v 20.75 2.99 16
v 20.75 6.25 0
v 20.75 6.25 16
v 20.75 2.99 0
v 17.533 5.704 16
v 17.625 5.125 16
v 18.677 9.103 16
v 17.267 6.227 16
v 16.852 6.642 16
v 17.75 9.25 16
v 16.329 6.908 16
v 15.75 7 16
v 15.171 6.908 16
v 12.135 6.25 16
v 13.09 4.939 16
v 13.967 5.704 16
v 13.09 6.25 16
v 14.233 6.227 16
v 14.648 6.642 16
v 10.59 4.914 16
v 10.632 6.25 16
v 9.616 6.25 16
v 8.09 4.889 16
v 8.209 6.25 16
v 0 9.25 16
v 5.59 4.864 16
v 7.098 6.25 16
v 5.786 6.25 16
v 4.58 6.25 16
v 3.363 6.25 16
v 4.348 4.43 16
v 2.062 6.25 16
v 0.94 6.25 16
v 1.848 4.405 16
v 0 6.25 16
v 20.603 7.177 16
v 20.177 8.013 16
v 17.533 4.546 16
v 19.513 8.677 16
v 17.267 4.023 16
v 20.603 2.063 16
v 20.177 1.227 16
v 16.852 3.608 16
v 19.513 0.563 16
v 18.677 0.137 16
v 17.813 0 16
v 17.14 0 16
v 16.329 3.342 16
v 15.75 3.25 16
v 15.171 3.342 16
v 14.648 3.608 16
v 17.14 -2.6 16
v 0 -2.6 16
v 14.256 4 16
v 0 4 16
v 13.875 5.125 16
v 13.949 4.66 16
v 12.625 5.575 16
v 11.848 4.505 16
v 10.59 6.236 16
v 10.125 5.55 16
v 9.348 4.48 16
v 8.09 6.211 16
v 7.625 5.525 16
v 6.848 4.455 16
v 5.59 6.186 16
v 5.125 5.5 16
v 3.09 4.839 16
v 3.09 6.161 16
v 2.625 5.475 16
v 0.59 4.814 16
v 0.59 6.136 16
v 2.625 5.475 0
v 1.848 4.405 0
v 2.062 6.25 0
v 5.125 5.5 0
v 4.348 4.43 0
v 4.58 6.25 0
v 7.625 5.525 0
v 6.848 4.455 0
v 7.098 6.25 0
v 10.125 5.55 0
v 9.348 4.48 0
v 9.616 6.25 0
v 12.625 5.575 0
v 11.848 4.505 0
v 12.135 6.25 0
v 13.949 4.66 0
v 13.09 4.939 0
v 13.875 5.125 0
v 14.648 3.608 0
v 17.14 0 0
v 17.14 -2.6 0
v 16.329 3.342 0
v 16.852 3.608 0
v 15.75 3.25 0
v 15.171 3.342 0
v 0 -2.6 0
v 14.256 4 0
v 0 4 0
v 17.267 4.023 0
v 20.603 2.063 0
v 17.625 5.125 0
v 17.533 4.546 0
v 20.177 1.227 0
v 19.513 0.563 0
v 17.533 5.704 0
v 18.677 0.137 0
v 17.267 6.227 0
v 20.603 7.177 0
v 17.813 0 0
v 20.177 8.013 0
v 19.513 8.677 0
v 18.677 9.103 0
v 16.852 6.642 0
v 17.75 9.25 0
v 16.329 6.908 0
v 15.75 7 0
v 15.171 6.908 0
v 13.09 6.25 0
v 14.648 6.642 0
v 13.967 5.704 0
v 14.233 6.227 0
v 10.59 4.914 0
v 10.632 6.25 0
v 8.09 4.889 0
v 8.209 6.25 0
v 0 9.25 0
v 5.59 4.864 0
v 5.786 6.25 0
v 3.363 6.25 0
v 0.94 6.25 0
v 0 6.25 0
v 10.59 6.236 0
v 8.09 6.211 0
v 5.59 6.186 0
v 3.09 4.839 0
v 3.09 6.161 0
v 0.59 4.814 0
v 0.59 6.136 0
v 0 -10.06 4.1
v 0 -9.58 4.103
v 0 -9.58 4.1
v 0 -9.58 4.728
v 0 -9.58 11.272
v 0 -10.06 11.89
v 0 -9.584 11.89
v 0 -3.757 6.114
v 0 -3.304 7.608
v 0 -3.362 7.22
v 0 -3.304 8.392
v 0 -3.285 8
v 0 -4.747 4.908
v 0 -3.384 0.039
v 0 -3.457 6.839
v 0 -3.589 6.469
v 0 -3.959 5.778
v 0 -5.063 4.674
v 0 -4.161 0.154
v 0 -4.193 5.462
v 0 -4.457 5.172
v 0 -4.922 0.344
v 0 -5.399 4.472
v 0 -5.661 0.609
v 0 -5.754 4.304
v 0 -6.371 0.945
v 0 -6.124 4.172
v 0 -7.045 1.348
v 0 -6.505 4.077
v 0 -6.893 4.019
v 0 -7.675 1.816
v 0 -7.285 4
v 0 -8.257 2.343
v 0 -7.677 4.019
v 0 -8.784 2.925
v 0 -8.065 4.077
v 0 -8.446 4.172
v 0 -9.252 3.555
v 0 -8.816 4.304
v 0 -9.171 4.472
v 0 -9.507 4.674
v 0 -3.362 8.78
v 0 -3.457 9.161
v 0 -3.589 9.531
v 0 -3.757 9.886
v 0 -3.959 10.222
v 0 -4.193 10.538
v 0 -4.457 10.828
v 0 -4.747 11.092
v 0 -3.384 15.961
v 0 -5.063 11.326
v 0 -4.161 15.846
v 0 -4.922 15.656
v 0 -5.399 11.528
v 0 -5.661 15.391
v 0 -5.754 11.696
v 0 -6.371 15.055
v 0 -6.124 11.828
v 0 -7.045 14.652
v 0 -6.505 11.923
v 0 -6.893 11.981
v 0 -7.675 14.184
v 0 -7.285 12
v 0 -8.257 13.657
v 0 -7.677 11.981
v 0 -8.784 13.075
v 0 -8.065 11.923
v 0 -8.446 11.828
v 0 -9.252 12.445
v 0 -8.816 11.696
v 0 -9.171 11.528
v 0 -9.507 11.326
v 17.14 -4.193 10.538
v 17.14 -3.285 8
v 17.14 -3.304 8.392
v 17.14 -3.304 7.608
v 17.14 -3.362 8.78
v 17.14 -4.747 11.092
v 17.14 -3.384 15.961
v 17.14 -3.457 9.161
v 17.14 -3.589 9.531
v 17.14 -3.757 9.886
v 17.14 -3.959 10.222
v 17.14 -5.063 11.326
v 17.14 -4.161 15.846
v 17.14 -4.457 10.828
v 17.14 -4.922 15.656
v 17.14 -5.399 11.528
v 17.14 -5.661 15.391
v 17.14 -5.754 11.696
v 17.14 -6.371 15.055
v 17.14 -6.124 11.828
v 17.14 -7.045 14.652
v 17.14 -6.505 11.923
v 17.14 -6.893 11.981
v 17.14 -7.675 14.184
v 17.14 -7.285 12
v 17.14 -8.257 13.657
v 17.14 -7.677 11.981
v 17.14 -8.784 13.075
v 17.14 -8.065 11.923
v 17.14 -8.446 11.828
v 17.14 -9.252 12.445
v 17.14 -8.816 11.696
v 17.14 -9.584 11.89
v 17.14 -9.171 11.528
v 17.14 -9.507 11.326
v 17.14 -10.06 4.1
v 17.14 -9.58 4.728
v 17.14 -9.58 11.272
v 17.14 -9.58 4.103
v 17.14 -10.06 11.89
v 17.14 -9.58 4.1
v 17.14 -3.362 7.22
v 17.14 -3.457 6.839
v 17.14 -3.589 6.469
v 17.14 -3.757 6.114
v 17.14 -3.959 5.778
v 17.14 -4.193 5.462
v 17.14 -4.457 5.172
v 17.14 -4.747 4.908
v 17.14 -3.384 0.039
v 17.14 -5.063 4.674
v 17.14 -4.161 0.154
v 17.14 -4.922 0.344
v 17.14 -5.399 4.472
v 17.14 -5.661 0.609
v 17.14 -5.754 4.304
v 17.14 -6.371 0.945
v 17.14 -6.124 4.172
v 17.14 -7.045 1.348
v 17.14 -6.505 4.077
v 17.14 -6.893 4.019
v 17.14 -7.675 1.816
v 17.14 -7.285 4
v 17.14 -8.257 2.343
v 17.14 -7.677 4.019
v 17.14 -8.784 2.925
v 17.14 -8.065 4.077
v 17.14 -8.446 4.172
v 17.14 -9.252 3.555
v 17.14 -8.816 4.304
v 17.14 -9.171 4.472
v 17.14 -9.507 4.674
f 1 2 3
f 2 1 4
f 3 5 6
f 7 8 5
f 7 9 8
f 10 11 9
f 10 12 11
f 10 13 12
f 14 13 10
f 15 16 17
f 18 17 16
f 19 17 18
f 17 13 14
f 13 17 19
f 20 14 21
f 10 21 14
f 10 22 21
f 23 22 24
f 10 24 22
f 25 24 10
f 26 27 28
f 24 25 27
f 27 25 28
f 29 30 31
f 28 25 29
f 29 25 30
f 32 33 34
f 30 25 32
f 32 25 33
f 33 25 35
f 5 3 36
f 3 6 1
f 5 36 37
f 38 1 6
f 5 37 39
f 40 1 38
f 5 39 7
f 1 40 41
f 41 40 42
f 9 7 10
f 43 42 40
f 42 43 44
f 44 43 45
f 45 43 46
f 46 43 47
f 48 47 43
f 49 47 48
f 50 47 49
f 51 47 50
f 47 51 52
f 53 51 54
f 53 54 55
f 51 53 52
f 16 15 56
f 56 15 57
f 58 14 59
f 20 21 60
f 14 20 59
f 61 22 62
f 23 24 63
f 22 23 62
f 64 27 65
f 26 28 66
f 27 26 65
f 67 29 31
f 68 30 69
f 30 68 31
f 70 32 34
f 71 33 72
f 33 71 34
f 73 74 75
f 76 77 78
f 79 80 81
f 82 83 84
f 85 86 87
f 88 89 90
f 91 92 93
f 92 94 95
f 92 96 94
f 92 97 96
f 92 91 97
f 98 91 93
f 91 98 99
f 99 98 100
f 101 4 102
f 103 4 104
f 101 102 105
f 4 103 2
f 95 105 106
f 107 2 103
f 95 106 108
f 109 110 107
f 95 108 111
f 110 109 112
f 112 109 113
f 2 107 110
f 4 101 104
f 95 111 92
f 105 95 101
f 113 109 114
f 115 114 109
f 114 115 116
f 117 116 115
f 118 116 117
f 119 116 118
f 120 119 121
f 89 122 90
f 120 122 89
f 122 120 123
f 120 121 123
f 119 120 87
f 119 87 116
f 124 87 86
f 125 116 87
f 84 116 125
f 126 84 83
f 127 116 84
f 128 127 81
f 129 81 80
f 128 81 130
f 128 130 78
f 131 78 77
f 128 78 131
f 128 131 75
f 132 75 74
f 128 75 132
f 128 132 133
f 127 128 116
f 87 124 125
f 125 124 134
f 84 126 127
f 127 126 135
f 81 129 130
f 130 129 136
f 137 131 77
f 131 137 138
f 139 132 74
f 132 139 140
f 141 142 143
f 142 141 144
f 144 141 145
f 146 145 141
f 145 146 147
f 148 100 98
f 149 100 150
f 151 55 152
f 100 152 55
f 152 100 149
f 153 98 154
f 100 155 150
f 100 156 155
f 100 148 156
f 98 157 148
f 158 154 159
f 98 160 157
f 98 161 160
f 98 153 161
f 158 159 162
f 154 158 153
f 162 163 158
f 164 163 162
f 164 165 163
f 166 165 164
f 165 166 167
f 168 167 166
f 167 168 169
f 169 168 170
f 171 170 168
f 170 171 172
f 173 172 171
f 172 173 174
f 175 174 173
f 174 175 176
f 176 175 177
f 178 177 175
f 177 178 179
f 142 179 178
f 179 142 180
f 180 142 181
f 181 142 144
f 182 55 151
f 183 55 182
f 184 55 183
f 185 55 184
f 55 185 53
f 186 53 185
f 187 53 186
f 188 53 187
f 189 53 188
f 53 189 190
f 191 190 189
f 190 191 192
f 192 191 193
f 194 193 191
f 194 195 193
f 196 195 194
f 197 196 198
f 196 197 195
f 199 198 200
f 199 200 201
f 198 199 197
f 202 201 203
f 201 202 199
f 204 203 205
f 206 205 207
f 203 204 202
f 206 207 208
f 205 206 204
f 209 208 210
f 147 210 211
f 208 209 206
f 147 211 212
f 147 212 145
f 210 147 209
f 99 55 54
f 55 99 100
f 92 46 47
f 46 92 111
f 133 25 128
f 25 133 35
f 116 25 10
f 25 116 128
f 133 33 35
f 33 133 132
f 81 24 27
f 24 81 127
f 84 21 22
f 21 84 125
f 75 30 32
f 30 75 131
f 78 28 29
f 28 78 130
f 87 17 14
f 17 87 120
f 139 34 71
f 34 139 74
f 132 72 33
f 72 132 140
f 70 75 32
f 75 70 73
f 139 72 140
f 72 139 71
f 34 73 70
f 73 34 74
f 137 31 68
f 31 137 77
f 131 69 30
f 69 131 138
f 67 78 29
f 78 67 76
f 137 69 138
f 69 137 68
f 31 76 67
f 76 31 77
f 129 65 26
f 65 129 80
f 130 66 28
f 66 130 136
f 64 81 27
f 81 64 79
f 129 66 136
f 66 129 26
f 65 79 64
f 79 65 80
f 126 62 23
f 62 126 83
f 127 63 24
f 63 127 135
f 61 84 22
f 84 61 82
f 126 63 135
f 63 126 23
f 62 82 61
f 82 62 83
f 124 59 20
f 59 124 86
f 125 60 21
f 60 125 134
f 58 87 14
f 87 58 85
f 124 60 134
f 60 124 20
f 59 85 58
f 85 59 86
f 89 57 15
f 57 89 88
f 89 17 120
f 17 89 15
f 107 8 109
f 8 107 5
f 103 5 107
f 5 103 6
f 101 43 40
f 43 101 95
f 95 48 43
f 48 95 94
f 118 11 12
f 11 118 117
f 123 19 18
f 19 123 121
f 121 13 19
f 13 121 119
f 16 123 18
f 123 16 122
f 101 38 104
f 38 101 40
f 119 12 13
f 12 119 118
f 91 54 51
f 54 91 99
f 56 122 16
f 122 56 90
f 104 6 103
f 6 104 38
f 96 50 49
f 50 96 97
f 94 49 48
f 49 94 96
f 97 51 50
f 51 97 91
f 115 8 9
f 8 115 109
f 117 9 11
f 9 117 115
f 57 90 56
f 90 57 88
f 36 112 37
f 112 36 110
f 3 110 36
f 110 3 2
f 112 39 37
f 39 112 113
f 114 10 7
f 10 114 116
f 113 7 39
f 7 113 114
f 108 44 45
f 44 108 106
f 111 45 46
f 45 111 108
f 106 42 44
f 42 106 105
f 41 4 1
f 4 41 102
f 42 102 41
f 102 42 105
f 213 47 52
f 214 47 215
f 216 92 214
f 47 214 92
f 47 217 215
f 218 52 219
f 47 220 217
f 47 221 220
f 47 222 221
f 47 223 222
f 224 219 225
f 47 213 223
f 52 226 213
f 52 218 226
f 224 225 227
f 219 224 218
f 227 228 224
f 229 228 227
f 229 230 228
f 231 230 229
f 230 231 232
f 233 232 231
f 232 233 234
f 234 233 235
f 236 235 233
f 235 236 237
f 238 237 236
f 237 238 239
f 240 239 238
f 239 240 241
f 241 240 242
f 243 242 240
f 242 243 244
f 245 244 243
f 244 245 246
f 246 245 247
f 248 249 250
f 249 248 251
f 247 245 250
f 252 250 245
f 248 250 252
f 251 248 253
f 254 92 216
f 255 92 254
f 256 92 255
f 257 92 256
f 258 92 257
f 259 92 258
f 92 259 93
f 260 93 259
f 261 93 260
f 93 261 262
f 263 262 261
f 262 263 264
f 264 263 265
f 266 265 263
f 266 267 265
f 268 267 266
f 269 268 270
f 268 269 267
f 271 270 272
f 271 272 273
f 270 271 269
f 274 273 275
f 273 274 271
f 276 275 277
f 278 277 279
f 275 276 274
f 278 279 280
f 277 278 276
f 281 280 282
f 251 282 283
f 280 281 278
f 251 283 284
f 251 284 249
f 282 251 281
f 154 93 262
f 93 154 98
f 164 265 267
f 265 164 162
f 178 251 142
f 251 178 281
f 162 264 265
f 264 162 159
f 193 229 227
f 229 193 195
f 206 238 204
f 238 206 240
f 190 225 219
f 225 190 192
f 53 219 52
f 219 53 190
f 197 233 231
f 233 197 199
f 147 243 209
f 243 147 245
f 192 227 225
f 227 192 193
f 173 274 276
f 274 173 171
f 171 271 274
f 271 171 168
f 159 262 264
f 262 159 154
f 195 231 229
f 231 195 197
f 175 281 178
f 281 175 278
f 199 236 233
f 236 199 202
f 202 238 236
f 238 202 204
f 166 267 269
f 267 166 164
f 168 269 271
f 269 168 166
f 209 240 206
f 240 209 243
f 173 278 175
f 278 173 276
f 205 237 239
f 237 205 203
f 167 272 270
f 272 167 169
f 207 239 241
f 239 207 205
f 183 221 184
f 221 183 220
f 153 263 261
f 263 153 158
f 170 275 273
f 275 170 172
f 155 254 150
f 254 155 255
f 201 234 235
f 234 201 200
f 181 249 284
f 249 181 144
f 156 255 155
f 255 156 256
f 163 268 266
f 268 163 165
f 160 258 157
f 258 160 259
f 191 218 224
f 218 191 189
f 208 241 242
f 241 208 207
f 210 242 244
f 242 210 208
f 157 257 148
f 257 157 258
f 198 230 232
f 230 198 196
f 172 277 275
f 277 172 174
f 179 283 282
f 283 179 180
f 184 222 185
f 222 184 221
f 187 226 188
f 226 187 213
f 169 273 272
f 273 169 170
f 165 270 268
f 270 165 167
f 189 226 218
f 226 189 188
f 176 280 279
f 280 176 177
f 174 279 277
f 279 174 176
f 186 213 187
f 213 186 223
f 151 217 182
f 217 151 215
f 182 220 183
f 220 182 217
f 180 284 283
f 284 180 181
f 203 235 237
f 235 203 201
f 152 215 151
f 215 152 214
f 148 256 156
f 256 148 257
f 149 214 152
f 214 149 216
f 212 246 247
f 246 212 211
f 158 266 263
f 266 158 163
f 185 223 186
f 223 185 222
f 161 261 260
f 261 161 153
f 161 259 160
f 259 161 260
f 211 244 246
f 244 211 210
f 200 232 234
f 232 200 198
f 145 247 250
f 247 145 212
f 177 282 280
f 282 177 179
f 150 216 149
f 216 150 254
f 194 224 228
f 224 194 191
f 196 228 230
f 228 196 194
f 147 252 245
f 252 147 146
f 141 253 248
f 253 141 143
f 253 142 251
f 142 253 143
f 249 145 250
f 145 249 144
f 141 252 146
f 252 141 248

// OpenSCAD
// This part is pretty specific to my Solidoode 2
//
// Use one of the old 8mm rods I just replaced in the solidoodle as a rail
// for the cable chain to glide on when it is near the left side (where
// most of the weight normally lives).
//
// After testing the initial version, I found that it was too high. Sometimes
// the chain had a hard time getting back on time when moving from right to left.
// This final version os a bit shorter.

extrude_width=0.48;
miny=-13.06;

// The clip, shoved all the way on to the sheetmetal will go 17.14 mm
// into the clip before the edge of the metal hits the back of the clip.
//
clipback=17.14;

// The space required to mount a chain end sitting on it's side.
//
chain_end_width=13.28;

// bars is the thickness of the other bars making up the clip.
//
bars = 3;

// leadingtooth is the gap between the middle bar and the leading tooth
// that sticks down from the top bar. Was 0.4
//
leadingtooth = 0.2;

// trailingtooth is the gap between the middle bar and the innermost
// tooth that sticks down from the top bar. Was 0.85, then 0.5
//
trailingtooth = 0.35;

// channel is the width of the channel the steel case runs through.
channel=2.25;

// middlebar is the thickness of the middle bar which determines how far off
// the steel frame the foamboard will be held. This should be large enough
// to clear the end of any rods, bolt heads, rivets, etc which stick out of
// the frame.
//
middlebar = 4;

// longedge is the longest edge that clips to the side of the frame.
//
longedge = 20.75;

// shortedge is the shortest bar that holds the edge of the foamboard.
//
shortedge = 15;

// exactfoam is the exact thickness of the foamboard which determine the space
// allowed to make a press fit for small strips of foamboard to fit under on the
// corners.
//
exactfoam = 5.2;

// Thickness of the foamboard for things that should not be a tight fit.
//
foamboard=exactfoam+1;

// clipheight is the height of the clip (too big and there are places it won't
// fit on the frame). I made the bottom, left, and right clips 20mm high
// and the short clips 10mm high.
//
clipheight = 16;

cornerad=bars;

toothyinc = (trailingtooth - leadingtooth) / 6.0;
toothxinc = (channel + 0.25);

firstoothy = (bars+foamboard+middlebar+channel+(channel/2.0))-(channel-trailingtooth);
firstoothx = (bars/2.0);

chain_end_height=22.43; // height when it is mounted on its side, that is.
case_to_chain=29.5-(chain_end_height/2); // height of back clip that works OK

bardia=8;   // diameter of bar I'm going to mount in clip

// Bit of corner to subtract from square shaped clip to round edges.
//
module cornerclip() {
   intersection() {
      difference() {
         translate([-cornerad, -cornerad,0])
            cube([cornerad*2,cornerad*2,clipheight+2]);
         translate([0,0,-2])
            cylinder(h=clipheight+4,r=(cornerad),$fn=20);
      }
      translate([0,0,-3])
         cube([cornerad*2,cornerad*2,clipheight+6]);
   }
}

// A squared off clip
//
module squareclip()
{
   difference() {
      union() {
         // thick middle bar rests on outside of case
         translate([0,foamboard+bars,0])
            cube([longedge,middlebar,clipheight]);
         // bar on inside of case that "teeth" are attached to
         translate([0,bars+foamboard+middlebar+channel,0])
            cube([longedge,bars,clipheight]);
         // top bar
         translate([shortedge,bars+foamboard,0])
            cube([longedge-shortedge,middlebar+bars+channel,clipheight]);
         // cylinders for the teeth (should make this a for loop)
         translate([firstoothx,firstoothy,0])
            cylinder(h=clipheight,r=(channel/2.0));
         translate([firstoothx+toothxinc,firstoothy+toothyinc,0])
            cylinder(h=clipheight,r=(channel/2.0));
         translate([firstoothx+2*toothxinc,firstoothy+2*toothyinc,0])
            cylinder(h=clipheight,r=(channel/2.0));
         translate([firstoothx+3*toothxinc,firstoothy+3*toothyinc,0])
            cylinder(h=clipheight,r=(channel/2.0));
         translate([firstoothx+4*toothxinc,firstoothy+4*toothyinc,0])
            cylinder(h=clipheight,r=(channel/2.0));
         translate([firstoothx+5*toothxinc,firstoothy+5*toothyinc,0])
            cylinder(h=clipheight,r=(channel/2.0));
      }
      // hole at top of channel to make it more flexible
      translate([shortedge+0.75,bars+foamboard+middlebar+(channel/2.0),-1])
         cylinder(h=clipheight+2,r=(bars+0.75)/2.0, $fn=20);
   }
}

// Clip with rounded corners
//
module roundclip() {
   translate([0,-(foamboard+bars),0])
      difference() {
         squareclip();
         translate([longedge-(cornerad),bars+foamboard+middlebar+channel,-1])
            cornerclip();
         translate([longedge-(cornerad),bars+foamboard+cornerad-0.01,-1])
            rotate([0,0,-90])
               cornerclip();
      }
}

shorten=3;

union() {
   // Start with basic clip
   roundclip();

   // Extend rounded piece from top of clip
   difference() {
      translate([0,(-5.6)+shorten,0])
         union() {
            cube([clipback,50,clipheight]);
            translate([0,0,clipheight/2])
               rotate([0,90,0])
                  cylinder(h=clipback,r=clipheight/2,$fn=64);
         }

      // subtract off excess
      translate([-250,1,-250])
         cube([500,500,500]);

      // Subtract bar from clip to leave hole
      translate([-1,(((bardia/2)+middlebar)-case_to_chain)+shorten,clipheight/2])
         rotate([0,90,0])
            cylinder(h=50,r=bardia/2, $fn=64);
   }

   // Add in some support so the top that curves over and down can print
   translate([0,miny+shorten,4.10]) cube([clipback,extrude_width,7.79]);
}
